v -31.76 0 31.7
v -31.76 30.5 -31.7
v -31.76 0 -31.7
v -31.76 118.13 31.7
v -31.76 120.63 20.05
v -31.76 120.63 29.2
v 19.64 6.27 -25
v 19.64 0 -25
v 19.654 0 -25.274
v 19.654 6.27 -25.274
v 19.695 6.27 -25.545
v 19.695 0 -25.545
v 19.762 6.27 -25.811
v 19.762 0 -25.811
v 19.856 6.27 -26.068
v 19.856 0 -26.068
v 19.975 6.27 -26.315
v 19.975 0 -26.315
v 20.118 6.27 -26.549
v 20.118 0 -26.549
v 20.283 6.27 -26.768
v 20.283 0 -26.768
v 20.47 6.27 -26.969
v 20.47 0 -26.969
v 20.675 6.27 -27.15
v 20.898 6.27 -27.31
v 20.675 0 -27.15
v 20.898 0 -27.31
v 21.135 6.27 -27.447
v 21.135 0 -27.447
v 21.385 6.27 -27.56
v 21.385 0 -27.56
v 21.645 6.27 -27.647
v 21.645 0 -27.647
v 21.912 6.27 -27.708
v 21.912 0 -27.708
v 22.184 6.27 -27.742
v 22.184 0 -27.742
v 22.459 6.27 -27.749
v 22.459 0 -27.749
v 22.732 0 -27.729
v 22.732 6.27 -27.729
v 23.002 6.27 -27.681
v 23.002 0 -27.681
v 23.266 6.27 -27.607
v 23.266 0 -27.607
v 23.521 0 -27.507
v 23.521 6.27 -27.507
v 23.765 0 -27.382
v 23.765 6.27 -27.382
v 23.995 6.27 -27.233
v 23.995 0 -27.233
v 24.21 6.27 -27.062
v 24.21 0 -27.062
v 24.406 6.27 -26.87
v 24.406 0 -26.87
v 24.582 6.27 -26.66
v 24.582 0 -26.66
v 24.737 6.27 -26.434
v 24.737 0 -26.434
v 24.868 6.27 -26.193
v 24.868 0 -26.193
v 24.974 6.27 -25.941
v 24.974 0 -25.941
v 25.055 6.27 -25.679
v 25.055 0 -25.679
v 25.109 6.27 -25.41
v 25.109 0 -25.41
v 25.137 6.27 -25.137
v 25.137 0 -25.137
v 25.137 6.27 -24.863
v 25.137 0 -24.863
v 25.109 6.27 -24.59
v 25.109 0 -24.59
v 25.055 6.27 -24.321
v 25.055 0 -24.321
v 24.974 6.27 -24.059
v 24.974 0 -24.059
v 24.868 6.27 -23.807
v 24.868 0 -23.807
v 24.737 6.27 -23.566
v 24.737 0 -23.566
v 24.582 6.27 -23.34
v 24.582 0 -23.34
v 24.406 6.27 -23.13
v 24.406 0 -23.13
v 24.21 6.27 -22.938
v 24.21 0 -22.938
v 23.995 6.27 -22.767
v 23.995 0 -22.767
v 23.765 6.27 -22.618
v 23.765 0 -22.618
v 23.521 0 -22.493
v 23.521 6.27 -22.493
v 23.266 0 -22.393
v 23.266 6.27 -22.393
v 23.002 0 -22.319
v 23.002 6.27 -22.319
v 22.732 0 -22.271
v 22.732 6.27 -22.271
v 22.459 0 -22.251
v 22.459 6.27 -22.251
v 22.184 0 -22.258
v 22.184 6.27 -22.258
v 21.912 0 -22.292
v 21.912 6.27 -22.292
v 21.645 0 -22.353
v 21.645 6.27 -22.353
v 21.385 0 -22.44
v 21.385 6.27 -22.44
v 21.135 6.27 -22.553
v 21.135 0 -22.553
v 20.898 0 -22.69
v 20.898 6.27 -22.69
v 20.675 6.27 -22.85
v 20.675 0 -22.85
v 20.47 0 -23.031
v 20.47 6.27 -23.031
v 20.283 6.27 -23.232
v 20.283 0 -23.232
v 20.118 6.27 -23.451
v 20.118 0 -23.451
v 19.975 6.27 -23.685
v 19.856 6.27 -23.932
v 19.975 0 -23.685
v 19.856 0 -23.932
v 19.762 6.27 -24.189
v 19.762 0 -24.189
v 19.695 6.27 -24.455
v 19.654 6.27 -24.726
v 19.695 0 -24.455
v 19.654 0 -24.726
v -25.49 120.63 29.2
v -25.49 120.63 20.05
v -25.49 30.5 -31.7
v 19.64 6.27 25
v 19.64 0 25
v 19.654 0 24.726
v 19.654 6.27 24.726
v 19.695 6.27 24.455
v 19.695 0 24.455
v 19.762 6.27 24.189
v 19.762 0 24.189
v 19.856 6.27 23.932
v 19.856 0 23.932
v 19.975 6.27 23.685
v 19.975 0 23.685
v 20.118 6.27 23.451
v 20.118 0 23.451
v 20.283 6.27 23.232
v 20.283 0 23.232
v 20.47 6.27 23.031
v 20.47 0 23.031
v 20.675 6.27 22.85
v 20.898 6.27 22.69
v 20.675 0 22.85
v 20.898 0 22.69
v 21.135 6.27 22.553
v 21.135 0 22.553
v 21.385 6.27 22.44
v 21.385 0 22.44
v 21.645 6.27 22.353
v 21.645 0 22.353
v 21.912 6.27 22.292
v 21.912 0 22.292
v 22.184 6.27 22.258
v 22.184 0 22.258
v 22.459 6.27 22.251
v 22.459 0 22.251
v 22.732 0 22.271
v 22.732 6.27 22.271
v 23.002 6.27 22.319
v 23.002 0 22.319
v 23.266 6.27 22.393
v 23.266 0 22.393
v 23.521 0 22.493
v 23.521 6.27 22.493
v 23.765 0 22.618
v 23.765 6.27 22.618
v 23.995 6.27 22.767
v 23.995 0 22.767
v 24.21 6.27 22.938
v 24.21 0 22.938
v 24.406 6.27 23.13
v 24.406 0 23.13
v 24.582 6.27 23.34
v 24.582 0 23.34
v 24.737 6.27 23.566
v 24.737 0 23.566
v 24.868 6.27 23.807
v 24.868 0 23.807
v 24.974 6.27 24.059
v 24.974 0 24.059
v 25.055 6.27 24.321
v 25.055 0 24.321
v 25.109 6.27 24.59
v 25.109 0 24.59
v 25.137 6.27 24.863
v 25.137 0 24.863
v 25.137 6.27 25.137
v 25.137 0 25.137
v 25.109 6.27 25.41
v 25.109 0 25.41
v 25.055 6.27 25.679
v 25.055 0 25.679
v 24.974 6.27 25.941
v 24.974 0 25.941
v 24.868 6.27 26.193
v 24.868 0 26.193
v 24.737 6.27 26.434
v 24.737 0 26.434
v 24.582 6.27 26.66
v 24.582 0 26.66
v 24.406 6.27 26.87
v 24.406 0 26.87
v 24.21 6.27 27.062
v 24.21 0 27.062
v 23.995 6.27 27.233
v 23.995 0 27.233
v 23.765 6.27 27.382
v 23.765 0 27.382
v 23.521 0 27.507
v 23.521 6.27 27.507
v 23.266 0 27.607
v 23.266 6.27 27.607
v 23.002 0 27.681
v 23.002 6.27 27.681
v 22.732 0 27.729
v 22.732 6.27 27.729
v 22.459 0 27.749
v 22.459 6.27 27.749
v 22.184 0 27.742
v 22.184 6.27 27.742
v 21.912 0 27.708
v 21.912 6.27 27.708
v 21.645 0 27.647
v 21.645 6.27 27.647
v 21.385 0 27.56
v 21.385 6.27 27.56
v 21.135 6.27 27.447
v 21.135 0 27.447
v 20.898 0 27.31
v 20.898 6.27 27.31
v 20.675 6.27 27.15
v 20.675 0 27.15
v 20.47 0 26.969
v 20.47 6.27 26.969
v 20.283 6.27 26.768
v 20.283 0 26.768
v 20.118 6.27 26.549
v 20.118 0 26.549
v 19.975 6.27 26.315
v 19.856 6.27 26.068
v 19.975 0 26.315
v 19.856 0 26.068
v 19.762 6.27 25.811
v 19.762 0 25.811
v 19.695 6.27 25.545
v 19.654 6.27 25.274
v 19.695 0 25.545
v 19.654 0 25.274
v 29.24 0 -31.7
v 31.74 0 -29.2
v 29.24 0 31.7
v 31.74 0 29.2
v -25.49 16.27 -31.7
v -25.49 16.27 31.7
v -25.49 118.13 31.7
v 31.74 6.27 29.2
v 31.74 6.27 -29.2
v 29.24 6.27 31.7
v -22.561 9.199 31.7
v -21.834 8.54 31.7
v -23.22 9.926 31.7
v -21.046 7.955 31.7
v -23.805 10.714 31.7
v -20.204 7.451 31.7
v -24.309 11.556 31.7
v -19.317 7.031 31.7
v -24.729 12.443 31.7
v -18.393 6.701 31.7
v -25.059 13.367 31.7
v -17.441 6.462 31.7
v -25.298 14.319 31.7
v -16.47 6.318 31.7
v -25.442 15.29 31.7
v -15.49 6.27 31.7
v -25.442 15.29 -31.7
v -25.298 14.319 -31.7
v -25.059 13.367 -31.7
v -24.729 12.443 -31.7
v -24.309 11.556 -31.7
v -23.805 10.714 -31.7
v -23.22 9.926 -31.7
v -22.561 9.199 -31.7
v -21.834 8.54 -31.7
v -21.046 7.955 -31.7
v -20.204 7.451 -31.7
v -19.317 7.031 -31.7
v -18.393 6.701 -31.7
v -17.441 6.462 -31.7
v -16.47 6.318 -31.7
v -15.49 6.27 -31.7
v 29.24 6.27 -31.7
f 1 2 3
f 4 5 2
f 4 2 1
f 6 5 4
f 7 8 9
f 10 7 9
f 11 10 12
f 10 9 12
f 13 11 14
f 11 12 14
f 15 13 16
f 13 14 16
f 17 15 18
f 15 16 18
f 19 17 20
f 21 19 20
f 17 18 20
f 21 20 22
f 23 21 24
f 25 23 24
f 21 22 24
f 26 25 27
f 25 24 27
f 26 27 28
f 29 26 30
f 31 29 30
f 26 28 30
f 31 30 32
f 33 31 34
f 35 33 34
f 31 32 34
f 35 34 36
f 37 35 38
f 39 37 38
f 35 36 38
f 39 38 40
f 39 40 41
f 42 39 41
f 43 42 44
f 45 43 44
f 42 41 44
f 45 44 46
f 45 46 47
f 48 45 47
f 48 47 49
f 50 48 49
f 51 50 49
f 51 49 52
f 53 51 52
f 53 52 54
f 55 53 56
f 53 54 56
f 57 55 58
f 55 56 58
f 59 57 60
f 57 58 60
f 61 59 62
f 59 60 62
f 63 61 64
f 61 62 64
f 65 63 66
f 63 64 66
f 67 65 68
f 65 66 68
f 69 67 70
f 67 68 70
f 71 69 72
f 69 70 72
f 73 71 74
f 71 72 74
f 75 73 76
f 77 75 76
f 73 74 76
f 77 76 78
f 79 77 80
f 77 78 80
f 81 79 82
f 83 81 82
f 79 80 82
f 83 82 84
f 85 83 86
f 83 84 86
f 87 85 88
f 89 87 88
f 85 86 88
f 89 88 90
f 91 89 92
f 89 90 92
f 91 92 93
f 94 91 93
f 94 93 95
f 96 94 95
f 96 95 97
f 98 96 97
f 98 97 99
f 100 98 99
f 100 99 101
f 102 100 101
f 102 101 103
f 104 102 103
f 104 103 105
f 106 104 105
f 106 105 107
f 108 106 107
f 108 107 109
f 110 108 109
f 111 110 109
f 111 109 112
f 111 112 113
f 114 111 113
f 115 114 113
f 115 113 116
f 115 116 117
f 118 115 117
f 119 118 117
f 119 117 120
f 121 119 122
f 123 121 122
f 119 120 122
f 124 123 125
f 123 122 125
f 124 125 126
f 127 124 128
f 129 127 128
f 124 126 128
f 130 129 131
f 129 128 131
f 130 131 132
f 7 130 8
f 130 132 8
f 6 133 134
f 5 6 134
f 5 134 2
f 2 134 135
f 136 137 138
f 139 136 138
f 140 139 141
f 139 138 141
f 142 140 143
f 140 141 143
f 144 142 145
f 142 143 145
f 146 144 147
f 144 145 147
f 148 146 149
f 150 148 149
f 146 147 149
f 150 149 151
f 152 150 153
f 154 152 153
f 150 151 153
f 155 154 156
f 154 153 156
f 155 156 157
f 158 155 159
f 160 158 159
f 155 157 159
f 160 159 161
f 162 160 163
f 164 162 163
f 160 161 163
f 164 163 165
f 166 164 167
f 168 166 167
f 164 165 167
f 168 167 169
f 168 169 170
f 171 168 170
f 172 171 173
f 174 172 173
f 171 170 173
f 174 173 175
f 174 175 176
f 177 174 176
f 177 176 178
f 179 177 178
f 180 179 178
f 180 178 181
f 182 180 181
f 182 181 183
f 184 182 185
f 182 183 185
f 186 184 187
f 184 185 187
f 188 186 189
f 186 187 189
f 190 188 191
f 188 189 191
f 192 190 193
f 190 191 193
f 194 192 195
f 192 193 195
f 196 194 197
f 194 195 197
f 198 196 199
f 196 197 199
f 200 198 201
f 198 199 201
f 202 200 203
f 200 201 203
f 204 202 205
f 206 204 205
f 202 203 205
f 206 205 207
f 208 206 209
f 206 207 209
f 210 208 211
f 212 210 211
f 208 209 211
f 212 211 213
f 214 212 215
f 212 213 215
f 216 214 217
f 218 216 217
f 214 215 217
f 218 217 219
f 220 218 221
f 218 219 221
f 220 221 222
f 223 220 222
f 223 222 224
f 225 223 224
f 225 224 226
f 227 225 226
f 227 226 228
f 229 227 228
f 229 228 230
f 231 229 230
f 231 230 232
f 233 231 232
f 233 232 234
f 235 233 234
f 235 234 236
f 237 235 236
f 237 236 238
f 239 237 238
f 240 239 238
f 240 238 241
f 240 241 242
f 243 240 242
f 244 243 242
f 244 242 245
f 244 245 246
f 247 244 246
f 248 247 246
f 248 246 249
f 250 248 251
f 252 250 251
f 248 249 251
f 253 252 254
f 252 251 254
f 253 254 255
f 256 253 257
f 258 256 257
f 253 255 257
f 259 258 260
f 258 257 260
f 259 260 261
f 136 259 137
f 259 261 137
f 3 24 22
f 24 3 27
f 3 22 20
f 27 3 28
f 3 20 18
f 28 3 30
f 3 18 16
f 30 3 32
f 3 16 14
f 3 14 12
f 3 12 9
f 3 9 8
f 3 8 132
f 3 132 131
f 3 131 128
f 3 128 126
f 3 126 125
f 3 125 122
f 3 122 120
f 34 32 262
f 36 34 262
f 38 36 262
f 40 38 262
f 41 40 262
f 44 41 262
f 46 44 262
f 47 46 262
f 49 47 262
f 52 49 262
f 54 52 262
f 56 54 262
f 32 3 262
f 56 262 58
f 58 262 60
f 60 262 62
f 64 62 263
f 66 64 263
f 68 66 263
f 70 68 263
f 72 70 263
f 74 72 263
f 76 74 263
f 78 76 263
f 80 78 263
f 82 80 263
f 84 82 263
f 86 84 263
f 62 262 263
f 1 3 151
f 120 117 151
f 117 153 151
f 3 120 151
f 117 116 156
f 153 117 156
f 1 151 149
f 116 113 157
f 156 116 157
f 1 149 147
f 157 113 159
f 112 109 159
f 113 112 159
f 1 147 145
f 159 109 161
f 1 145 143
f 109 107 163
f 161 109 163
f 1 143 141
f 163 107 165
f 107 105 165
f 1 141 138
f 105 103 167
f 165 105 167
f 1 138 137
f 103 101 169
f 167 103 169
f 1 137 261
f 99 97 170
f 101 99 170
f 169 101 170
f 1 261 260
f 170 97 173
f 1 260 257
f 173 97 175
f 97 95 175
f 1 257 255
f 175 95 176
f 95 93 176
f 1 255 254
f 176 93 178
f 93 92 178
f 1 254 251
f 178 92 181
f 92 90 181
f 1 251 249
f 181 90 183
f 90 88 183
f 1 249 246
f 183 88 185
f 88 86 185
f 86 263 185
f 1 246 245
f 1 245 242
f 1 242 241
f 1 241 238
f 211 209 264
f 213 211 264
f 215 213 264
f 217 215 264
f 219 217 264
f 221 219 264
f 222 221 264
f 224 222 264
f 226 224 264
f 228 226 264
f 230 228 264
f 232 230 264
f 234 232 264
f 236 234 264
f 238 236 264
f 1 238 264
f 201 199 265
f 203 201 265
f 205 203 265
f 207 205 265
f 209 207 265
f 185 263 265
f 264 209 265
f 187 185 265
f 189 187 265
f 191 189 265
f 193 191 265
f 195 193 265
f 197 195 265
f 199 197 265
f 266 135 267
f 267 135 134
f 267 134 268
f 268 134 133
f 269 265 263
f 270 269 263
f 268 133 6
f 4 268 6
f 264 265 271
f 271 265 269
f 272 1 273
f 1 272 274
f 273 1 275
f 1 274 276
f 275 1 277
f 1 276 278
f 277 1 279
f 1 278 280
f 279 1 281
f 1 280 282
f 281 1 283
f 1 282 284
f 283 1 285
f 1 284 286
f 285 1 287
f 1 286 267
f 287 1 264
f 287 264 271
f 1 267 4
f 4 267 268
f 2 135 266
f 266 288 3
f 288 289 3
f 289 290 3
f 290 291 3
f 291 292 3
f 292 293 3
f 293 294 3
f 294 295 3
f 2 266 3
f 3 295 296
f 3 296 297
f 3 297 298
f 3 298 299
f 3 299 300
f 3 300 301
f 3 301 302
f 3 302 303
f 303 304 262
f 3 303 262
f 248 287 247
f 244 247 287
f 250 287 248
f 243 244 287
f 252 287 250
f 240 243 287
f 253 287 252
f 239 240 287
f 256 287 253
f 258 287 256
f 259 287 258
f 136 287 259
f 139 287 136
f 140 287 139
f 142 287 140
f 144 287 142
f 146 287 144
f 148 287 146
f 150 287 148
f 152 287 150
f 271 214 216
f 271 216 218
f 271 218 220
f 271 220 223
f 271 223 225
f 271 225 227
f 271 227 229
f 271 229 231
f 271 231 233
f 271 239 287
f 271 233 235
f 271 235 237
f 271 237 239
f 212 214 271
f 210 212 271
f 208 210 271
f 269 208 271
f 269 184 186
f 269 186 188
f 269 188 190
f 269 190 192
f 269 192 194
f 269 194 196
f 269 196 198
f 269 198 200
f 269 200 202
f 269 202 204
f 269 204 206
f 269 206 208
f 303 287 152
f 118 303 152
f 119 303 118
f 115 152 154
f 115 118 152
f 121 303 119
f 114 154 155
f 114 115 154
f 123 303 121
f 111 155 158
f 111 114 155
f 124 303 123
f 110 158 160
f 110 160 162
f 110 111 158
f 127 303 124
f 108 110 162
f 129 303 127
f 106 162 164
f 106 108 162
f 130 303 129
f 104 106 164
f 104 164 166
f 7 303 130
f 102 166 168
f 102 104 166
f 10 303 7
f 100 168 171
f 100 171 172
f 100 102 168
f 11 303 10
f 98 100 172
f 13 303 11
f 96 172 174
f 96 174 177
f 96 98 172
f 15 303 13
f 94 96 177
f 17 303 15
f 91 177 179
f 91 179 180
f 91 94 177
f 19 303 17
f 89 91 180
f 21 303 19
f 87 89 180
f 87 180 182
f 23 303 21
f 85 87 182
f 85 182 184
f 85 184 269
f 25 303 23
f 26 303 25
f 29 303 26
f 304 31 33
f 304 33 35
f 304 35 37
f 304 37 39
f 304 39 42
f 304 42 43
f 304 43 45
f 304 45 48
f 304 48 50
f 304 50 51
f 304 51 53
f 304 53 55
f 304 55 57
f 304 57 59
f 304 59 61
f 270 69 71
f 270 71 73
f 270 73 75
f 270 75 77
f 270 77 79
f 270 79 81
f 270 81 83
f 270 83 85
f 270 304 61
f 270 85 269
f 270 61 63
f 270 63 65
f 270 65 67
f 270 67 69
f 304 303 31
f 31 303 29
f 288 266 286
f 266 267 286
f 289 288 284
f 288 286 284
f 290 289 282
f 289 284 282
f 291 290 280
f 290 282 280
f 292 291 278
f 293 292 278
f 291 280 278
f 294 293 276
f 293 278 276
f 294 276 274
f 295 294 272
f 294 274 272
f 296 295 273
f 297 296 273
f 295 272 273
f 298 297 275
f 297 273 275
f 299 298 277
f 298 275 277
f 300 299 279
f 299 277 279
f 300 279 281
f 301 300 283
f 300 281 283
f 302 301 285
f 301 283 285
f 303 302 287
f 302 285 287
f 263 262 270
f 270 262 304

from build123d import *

# Parameters (mm, degrees)
ESBO_O1_W                = 63.48
ESBO_O1_H                = 63.4
RESSALTO_EXTRUS_O1_DEPTH = 6.27
CHANFRO1_SIZE            = 2.5
RESSALTO_EXTRUS_O2_DEPTH = 6.27
CHANFRO2_SIZE            = 2.5
FILETE1_R                = 10
ESBO_O3_R                = 2.75
CORTE_EXTRUS_O1_DEPTH    = 6.27


with BuildPart() as part:
    # Esboço1 → Ressalto-extrusão1 (new body)
    with BuildSketch(Plane(origin=(0, 0, 0), x_dir=(1, 0, 0), z_dir=(0, 1, 0))):
        Rectangle(ESBO_O1_W, ESBO_O1_H)
    extrude(amount=RESSALTO_EXTRUS_O1_DEPTH)

    # Chanfro1
    chanfro1_edges = [part.edges().sort_by_distance(p)[0] for p in [
        (31.74, 3.135, -31.7),
        (31.74, 3.135, 31.7),
    ]]
    chamfer(chanfro1_edges, length=CHANFRO1_SIZE)

    # Esboço2 → Ressalto-extrusão2 (add)
    with BuildSketch(Plane.ZY.offset(25.49)):
        Polygon((-31.7, 30.5), (-31.7, 0), (31.7, 0), (31.7, 30.5), (31.7, 120.63), (20.05, 120.63), align=None)
    extrude(amount=RESSALTO_EXTRUS_O2_DEPTH)

    # Chanfro2
    chanfro2_edges = [part.edges().sort_by_distance(p)[0] for p in [
        (-28.625, 120.63, 31.7),
    ]]
    chamfer(chanfro2_edges, length=CHANFRO2_SIZE)

    # Filete1
    filete1_edges = [part.edges().sort_by_distance(p)[0] for p in [
        (-25.49, 6.27, 0),
    ]]
    fillet(filete1_edges, radius=FILETE1_R)

    # Esboço3 → Corte-extrusão1 (cut)
    with BuildSketch(Plane(origin=(0, 0, 0), x_dir=(-1, 0, 0), z_dir=(0, -1, 0))):
        with Locations((-22.39, -25)):
            Circle(ESBO_O3_R)
        with Locations((-22.39, 25)):
            Circle(ESBO_O3_R)
    extrude(amount=-CORTE_EXTRUS_O1_DEPTH, mode=Mode.SUBTRACT)


solid = part.part
